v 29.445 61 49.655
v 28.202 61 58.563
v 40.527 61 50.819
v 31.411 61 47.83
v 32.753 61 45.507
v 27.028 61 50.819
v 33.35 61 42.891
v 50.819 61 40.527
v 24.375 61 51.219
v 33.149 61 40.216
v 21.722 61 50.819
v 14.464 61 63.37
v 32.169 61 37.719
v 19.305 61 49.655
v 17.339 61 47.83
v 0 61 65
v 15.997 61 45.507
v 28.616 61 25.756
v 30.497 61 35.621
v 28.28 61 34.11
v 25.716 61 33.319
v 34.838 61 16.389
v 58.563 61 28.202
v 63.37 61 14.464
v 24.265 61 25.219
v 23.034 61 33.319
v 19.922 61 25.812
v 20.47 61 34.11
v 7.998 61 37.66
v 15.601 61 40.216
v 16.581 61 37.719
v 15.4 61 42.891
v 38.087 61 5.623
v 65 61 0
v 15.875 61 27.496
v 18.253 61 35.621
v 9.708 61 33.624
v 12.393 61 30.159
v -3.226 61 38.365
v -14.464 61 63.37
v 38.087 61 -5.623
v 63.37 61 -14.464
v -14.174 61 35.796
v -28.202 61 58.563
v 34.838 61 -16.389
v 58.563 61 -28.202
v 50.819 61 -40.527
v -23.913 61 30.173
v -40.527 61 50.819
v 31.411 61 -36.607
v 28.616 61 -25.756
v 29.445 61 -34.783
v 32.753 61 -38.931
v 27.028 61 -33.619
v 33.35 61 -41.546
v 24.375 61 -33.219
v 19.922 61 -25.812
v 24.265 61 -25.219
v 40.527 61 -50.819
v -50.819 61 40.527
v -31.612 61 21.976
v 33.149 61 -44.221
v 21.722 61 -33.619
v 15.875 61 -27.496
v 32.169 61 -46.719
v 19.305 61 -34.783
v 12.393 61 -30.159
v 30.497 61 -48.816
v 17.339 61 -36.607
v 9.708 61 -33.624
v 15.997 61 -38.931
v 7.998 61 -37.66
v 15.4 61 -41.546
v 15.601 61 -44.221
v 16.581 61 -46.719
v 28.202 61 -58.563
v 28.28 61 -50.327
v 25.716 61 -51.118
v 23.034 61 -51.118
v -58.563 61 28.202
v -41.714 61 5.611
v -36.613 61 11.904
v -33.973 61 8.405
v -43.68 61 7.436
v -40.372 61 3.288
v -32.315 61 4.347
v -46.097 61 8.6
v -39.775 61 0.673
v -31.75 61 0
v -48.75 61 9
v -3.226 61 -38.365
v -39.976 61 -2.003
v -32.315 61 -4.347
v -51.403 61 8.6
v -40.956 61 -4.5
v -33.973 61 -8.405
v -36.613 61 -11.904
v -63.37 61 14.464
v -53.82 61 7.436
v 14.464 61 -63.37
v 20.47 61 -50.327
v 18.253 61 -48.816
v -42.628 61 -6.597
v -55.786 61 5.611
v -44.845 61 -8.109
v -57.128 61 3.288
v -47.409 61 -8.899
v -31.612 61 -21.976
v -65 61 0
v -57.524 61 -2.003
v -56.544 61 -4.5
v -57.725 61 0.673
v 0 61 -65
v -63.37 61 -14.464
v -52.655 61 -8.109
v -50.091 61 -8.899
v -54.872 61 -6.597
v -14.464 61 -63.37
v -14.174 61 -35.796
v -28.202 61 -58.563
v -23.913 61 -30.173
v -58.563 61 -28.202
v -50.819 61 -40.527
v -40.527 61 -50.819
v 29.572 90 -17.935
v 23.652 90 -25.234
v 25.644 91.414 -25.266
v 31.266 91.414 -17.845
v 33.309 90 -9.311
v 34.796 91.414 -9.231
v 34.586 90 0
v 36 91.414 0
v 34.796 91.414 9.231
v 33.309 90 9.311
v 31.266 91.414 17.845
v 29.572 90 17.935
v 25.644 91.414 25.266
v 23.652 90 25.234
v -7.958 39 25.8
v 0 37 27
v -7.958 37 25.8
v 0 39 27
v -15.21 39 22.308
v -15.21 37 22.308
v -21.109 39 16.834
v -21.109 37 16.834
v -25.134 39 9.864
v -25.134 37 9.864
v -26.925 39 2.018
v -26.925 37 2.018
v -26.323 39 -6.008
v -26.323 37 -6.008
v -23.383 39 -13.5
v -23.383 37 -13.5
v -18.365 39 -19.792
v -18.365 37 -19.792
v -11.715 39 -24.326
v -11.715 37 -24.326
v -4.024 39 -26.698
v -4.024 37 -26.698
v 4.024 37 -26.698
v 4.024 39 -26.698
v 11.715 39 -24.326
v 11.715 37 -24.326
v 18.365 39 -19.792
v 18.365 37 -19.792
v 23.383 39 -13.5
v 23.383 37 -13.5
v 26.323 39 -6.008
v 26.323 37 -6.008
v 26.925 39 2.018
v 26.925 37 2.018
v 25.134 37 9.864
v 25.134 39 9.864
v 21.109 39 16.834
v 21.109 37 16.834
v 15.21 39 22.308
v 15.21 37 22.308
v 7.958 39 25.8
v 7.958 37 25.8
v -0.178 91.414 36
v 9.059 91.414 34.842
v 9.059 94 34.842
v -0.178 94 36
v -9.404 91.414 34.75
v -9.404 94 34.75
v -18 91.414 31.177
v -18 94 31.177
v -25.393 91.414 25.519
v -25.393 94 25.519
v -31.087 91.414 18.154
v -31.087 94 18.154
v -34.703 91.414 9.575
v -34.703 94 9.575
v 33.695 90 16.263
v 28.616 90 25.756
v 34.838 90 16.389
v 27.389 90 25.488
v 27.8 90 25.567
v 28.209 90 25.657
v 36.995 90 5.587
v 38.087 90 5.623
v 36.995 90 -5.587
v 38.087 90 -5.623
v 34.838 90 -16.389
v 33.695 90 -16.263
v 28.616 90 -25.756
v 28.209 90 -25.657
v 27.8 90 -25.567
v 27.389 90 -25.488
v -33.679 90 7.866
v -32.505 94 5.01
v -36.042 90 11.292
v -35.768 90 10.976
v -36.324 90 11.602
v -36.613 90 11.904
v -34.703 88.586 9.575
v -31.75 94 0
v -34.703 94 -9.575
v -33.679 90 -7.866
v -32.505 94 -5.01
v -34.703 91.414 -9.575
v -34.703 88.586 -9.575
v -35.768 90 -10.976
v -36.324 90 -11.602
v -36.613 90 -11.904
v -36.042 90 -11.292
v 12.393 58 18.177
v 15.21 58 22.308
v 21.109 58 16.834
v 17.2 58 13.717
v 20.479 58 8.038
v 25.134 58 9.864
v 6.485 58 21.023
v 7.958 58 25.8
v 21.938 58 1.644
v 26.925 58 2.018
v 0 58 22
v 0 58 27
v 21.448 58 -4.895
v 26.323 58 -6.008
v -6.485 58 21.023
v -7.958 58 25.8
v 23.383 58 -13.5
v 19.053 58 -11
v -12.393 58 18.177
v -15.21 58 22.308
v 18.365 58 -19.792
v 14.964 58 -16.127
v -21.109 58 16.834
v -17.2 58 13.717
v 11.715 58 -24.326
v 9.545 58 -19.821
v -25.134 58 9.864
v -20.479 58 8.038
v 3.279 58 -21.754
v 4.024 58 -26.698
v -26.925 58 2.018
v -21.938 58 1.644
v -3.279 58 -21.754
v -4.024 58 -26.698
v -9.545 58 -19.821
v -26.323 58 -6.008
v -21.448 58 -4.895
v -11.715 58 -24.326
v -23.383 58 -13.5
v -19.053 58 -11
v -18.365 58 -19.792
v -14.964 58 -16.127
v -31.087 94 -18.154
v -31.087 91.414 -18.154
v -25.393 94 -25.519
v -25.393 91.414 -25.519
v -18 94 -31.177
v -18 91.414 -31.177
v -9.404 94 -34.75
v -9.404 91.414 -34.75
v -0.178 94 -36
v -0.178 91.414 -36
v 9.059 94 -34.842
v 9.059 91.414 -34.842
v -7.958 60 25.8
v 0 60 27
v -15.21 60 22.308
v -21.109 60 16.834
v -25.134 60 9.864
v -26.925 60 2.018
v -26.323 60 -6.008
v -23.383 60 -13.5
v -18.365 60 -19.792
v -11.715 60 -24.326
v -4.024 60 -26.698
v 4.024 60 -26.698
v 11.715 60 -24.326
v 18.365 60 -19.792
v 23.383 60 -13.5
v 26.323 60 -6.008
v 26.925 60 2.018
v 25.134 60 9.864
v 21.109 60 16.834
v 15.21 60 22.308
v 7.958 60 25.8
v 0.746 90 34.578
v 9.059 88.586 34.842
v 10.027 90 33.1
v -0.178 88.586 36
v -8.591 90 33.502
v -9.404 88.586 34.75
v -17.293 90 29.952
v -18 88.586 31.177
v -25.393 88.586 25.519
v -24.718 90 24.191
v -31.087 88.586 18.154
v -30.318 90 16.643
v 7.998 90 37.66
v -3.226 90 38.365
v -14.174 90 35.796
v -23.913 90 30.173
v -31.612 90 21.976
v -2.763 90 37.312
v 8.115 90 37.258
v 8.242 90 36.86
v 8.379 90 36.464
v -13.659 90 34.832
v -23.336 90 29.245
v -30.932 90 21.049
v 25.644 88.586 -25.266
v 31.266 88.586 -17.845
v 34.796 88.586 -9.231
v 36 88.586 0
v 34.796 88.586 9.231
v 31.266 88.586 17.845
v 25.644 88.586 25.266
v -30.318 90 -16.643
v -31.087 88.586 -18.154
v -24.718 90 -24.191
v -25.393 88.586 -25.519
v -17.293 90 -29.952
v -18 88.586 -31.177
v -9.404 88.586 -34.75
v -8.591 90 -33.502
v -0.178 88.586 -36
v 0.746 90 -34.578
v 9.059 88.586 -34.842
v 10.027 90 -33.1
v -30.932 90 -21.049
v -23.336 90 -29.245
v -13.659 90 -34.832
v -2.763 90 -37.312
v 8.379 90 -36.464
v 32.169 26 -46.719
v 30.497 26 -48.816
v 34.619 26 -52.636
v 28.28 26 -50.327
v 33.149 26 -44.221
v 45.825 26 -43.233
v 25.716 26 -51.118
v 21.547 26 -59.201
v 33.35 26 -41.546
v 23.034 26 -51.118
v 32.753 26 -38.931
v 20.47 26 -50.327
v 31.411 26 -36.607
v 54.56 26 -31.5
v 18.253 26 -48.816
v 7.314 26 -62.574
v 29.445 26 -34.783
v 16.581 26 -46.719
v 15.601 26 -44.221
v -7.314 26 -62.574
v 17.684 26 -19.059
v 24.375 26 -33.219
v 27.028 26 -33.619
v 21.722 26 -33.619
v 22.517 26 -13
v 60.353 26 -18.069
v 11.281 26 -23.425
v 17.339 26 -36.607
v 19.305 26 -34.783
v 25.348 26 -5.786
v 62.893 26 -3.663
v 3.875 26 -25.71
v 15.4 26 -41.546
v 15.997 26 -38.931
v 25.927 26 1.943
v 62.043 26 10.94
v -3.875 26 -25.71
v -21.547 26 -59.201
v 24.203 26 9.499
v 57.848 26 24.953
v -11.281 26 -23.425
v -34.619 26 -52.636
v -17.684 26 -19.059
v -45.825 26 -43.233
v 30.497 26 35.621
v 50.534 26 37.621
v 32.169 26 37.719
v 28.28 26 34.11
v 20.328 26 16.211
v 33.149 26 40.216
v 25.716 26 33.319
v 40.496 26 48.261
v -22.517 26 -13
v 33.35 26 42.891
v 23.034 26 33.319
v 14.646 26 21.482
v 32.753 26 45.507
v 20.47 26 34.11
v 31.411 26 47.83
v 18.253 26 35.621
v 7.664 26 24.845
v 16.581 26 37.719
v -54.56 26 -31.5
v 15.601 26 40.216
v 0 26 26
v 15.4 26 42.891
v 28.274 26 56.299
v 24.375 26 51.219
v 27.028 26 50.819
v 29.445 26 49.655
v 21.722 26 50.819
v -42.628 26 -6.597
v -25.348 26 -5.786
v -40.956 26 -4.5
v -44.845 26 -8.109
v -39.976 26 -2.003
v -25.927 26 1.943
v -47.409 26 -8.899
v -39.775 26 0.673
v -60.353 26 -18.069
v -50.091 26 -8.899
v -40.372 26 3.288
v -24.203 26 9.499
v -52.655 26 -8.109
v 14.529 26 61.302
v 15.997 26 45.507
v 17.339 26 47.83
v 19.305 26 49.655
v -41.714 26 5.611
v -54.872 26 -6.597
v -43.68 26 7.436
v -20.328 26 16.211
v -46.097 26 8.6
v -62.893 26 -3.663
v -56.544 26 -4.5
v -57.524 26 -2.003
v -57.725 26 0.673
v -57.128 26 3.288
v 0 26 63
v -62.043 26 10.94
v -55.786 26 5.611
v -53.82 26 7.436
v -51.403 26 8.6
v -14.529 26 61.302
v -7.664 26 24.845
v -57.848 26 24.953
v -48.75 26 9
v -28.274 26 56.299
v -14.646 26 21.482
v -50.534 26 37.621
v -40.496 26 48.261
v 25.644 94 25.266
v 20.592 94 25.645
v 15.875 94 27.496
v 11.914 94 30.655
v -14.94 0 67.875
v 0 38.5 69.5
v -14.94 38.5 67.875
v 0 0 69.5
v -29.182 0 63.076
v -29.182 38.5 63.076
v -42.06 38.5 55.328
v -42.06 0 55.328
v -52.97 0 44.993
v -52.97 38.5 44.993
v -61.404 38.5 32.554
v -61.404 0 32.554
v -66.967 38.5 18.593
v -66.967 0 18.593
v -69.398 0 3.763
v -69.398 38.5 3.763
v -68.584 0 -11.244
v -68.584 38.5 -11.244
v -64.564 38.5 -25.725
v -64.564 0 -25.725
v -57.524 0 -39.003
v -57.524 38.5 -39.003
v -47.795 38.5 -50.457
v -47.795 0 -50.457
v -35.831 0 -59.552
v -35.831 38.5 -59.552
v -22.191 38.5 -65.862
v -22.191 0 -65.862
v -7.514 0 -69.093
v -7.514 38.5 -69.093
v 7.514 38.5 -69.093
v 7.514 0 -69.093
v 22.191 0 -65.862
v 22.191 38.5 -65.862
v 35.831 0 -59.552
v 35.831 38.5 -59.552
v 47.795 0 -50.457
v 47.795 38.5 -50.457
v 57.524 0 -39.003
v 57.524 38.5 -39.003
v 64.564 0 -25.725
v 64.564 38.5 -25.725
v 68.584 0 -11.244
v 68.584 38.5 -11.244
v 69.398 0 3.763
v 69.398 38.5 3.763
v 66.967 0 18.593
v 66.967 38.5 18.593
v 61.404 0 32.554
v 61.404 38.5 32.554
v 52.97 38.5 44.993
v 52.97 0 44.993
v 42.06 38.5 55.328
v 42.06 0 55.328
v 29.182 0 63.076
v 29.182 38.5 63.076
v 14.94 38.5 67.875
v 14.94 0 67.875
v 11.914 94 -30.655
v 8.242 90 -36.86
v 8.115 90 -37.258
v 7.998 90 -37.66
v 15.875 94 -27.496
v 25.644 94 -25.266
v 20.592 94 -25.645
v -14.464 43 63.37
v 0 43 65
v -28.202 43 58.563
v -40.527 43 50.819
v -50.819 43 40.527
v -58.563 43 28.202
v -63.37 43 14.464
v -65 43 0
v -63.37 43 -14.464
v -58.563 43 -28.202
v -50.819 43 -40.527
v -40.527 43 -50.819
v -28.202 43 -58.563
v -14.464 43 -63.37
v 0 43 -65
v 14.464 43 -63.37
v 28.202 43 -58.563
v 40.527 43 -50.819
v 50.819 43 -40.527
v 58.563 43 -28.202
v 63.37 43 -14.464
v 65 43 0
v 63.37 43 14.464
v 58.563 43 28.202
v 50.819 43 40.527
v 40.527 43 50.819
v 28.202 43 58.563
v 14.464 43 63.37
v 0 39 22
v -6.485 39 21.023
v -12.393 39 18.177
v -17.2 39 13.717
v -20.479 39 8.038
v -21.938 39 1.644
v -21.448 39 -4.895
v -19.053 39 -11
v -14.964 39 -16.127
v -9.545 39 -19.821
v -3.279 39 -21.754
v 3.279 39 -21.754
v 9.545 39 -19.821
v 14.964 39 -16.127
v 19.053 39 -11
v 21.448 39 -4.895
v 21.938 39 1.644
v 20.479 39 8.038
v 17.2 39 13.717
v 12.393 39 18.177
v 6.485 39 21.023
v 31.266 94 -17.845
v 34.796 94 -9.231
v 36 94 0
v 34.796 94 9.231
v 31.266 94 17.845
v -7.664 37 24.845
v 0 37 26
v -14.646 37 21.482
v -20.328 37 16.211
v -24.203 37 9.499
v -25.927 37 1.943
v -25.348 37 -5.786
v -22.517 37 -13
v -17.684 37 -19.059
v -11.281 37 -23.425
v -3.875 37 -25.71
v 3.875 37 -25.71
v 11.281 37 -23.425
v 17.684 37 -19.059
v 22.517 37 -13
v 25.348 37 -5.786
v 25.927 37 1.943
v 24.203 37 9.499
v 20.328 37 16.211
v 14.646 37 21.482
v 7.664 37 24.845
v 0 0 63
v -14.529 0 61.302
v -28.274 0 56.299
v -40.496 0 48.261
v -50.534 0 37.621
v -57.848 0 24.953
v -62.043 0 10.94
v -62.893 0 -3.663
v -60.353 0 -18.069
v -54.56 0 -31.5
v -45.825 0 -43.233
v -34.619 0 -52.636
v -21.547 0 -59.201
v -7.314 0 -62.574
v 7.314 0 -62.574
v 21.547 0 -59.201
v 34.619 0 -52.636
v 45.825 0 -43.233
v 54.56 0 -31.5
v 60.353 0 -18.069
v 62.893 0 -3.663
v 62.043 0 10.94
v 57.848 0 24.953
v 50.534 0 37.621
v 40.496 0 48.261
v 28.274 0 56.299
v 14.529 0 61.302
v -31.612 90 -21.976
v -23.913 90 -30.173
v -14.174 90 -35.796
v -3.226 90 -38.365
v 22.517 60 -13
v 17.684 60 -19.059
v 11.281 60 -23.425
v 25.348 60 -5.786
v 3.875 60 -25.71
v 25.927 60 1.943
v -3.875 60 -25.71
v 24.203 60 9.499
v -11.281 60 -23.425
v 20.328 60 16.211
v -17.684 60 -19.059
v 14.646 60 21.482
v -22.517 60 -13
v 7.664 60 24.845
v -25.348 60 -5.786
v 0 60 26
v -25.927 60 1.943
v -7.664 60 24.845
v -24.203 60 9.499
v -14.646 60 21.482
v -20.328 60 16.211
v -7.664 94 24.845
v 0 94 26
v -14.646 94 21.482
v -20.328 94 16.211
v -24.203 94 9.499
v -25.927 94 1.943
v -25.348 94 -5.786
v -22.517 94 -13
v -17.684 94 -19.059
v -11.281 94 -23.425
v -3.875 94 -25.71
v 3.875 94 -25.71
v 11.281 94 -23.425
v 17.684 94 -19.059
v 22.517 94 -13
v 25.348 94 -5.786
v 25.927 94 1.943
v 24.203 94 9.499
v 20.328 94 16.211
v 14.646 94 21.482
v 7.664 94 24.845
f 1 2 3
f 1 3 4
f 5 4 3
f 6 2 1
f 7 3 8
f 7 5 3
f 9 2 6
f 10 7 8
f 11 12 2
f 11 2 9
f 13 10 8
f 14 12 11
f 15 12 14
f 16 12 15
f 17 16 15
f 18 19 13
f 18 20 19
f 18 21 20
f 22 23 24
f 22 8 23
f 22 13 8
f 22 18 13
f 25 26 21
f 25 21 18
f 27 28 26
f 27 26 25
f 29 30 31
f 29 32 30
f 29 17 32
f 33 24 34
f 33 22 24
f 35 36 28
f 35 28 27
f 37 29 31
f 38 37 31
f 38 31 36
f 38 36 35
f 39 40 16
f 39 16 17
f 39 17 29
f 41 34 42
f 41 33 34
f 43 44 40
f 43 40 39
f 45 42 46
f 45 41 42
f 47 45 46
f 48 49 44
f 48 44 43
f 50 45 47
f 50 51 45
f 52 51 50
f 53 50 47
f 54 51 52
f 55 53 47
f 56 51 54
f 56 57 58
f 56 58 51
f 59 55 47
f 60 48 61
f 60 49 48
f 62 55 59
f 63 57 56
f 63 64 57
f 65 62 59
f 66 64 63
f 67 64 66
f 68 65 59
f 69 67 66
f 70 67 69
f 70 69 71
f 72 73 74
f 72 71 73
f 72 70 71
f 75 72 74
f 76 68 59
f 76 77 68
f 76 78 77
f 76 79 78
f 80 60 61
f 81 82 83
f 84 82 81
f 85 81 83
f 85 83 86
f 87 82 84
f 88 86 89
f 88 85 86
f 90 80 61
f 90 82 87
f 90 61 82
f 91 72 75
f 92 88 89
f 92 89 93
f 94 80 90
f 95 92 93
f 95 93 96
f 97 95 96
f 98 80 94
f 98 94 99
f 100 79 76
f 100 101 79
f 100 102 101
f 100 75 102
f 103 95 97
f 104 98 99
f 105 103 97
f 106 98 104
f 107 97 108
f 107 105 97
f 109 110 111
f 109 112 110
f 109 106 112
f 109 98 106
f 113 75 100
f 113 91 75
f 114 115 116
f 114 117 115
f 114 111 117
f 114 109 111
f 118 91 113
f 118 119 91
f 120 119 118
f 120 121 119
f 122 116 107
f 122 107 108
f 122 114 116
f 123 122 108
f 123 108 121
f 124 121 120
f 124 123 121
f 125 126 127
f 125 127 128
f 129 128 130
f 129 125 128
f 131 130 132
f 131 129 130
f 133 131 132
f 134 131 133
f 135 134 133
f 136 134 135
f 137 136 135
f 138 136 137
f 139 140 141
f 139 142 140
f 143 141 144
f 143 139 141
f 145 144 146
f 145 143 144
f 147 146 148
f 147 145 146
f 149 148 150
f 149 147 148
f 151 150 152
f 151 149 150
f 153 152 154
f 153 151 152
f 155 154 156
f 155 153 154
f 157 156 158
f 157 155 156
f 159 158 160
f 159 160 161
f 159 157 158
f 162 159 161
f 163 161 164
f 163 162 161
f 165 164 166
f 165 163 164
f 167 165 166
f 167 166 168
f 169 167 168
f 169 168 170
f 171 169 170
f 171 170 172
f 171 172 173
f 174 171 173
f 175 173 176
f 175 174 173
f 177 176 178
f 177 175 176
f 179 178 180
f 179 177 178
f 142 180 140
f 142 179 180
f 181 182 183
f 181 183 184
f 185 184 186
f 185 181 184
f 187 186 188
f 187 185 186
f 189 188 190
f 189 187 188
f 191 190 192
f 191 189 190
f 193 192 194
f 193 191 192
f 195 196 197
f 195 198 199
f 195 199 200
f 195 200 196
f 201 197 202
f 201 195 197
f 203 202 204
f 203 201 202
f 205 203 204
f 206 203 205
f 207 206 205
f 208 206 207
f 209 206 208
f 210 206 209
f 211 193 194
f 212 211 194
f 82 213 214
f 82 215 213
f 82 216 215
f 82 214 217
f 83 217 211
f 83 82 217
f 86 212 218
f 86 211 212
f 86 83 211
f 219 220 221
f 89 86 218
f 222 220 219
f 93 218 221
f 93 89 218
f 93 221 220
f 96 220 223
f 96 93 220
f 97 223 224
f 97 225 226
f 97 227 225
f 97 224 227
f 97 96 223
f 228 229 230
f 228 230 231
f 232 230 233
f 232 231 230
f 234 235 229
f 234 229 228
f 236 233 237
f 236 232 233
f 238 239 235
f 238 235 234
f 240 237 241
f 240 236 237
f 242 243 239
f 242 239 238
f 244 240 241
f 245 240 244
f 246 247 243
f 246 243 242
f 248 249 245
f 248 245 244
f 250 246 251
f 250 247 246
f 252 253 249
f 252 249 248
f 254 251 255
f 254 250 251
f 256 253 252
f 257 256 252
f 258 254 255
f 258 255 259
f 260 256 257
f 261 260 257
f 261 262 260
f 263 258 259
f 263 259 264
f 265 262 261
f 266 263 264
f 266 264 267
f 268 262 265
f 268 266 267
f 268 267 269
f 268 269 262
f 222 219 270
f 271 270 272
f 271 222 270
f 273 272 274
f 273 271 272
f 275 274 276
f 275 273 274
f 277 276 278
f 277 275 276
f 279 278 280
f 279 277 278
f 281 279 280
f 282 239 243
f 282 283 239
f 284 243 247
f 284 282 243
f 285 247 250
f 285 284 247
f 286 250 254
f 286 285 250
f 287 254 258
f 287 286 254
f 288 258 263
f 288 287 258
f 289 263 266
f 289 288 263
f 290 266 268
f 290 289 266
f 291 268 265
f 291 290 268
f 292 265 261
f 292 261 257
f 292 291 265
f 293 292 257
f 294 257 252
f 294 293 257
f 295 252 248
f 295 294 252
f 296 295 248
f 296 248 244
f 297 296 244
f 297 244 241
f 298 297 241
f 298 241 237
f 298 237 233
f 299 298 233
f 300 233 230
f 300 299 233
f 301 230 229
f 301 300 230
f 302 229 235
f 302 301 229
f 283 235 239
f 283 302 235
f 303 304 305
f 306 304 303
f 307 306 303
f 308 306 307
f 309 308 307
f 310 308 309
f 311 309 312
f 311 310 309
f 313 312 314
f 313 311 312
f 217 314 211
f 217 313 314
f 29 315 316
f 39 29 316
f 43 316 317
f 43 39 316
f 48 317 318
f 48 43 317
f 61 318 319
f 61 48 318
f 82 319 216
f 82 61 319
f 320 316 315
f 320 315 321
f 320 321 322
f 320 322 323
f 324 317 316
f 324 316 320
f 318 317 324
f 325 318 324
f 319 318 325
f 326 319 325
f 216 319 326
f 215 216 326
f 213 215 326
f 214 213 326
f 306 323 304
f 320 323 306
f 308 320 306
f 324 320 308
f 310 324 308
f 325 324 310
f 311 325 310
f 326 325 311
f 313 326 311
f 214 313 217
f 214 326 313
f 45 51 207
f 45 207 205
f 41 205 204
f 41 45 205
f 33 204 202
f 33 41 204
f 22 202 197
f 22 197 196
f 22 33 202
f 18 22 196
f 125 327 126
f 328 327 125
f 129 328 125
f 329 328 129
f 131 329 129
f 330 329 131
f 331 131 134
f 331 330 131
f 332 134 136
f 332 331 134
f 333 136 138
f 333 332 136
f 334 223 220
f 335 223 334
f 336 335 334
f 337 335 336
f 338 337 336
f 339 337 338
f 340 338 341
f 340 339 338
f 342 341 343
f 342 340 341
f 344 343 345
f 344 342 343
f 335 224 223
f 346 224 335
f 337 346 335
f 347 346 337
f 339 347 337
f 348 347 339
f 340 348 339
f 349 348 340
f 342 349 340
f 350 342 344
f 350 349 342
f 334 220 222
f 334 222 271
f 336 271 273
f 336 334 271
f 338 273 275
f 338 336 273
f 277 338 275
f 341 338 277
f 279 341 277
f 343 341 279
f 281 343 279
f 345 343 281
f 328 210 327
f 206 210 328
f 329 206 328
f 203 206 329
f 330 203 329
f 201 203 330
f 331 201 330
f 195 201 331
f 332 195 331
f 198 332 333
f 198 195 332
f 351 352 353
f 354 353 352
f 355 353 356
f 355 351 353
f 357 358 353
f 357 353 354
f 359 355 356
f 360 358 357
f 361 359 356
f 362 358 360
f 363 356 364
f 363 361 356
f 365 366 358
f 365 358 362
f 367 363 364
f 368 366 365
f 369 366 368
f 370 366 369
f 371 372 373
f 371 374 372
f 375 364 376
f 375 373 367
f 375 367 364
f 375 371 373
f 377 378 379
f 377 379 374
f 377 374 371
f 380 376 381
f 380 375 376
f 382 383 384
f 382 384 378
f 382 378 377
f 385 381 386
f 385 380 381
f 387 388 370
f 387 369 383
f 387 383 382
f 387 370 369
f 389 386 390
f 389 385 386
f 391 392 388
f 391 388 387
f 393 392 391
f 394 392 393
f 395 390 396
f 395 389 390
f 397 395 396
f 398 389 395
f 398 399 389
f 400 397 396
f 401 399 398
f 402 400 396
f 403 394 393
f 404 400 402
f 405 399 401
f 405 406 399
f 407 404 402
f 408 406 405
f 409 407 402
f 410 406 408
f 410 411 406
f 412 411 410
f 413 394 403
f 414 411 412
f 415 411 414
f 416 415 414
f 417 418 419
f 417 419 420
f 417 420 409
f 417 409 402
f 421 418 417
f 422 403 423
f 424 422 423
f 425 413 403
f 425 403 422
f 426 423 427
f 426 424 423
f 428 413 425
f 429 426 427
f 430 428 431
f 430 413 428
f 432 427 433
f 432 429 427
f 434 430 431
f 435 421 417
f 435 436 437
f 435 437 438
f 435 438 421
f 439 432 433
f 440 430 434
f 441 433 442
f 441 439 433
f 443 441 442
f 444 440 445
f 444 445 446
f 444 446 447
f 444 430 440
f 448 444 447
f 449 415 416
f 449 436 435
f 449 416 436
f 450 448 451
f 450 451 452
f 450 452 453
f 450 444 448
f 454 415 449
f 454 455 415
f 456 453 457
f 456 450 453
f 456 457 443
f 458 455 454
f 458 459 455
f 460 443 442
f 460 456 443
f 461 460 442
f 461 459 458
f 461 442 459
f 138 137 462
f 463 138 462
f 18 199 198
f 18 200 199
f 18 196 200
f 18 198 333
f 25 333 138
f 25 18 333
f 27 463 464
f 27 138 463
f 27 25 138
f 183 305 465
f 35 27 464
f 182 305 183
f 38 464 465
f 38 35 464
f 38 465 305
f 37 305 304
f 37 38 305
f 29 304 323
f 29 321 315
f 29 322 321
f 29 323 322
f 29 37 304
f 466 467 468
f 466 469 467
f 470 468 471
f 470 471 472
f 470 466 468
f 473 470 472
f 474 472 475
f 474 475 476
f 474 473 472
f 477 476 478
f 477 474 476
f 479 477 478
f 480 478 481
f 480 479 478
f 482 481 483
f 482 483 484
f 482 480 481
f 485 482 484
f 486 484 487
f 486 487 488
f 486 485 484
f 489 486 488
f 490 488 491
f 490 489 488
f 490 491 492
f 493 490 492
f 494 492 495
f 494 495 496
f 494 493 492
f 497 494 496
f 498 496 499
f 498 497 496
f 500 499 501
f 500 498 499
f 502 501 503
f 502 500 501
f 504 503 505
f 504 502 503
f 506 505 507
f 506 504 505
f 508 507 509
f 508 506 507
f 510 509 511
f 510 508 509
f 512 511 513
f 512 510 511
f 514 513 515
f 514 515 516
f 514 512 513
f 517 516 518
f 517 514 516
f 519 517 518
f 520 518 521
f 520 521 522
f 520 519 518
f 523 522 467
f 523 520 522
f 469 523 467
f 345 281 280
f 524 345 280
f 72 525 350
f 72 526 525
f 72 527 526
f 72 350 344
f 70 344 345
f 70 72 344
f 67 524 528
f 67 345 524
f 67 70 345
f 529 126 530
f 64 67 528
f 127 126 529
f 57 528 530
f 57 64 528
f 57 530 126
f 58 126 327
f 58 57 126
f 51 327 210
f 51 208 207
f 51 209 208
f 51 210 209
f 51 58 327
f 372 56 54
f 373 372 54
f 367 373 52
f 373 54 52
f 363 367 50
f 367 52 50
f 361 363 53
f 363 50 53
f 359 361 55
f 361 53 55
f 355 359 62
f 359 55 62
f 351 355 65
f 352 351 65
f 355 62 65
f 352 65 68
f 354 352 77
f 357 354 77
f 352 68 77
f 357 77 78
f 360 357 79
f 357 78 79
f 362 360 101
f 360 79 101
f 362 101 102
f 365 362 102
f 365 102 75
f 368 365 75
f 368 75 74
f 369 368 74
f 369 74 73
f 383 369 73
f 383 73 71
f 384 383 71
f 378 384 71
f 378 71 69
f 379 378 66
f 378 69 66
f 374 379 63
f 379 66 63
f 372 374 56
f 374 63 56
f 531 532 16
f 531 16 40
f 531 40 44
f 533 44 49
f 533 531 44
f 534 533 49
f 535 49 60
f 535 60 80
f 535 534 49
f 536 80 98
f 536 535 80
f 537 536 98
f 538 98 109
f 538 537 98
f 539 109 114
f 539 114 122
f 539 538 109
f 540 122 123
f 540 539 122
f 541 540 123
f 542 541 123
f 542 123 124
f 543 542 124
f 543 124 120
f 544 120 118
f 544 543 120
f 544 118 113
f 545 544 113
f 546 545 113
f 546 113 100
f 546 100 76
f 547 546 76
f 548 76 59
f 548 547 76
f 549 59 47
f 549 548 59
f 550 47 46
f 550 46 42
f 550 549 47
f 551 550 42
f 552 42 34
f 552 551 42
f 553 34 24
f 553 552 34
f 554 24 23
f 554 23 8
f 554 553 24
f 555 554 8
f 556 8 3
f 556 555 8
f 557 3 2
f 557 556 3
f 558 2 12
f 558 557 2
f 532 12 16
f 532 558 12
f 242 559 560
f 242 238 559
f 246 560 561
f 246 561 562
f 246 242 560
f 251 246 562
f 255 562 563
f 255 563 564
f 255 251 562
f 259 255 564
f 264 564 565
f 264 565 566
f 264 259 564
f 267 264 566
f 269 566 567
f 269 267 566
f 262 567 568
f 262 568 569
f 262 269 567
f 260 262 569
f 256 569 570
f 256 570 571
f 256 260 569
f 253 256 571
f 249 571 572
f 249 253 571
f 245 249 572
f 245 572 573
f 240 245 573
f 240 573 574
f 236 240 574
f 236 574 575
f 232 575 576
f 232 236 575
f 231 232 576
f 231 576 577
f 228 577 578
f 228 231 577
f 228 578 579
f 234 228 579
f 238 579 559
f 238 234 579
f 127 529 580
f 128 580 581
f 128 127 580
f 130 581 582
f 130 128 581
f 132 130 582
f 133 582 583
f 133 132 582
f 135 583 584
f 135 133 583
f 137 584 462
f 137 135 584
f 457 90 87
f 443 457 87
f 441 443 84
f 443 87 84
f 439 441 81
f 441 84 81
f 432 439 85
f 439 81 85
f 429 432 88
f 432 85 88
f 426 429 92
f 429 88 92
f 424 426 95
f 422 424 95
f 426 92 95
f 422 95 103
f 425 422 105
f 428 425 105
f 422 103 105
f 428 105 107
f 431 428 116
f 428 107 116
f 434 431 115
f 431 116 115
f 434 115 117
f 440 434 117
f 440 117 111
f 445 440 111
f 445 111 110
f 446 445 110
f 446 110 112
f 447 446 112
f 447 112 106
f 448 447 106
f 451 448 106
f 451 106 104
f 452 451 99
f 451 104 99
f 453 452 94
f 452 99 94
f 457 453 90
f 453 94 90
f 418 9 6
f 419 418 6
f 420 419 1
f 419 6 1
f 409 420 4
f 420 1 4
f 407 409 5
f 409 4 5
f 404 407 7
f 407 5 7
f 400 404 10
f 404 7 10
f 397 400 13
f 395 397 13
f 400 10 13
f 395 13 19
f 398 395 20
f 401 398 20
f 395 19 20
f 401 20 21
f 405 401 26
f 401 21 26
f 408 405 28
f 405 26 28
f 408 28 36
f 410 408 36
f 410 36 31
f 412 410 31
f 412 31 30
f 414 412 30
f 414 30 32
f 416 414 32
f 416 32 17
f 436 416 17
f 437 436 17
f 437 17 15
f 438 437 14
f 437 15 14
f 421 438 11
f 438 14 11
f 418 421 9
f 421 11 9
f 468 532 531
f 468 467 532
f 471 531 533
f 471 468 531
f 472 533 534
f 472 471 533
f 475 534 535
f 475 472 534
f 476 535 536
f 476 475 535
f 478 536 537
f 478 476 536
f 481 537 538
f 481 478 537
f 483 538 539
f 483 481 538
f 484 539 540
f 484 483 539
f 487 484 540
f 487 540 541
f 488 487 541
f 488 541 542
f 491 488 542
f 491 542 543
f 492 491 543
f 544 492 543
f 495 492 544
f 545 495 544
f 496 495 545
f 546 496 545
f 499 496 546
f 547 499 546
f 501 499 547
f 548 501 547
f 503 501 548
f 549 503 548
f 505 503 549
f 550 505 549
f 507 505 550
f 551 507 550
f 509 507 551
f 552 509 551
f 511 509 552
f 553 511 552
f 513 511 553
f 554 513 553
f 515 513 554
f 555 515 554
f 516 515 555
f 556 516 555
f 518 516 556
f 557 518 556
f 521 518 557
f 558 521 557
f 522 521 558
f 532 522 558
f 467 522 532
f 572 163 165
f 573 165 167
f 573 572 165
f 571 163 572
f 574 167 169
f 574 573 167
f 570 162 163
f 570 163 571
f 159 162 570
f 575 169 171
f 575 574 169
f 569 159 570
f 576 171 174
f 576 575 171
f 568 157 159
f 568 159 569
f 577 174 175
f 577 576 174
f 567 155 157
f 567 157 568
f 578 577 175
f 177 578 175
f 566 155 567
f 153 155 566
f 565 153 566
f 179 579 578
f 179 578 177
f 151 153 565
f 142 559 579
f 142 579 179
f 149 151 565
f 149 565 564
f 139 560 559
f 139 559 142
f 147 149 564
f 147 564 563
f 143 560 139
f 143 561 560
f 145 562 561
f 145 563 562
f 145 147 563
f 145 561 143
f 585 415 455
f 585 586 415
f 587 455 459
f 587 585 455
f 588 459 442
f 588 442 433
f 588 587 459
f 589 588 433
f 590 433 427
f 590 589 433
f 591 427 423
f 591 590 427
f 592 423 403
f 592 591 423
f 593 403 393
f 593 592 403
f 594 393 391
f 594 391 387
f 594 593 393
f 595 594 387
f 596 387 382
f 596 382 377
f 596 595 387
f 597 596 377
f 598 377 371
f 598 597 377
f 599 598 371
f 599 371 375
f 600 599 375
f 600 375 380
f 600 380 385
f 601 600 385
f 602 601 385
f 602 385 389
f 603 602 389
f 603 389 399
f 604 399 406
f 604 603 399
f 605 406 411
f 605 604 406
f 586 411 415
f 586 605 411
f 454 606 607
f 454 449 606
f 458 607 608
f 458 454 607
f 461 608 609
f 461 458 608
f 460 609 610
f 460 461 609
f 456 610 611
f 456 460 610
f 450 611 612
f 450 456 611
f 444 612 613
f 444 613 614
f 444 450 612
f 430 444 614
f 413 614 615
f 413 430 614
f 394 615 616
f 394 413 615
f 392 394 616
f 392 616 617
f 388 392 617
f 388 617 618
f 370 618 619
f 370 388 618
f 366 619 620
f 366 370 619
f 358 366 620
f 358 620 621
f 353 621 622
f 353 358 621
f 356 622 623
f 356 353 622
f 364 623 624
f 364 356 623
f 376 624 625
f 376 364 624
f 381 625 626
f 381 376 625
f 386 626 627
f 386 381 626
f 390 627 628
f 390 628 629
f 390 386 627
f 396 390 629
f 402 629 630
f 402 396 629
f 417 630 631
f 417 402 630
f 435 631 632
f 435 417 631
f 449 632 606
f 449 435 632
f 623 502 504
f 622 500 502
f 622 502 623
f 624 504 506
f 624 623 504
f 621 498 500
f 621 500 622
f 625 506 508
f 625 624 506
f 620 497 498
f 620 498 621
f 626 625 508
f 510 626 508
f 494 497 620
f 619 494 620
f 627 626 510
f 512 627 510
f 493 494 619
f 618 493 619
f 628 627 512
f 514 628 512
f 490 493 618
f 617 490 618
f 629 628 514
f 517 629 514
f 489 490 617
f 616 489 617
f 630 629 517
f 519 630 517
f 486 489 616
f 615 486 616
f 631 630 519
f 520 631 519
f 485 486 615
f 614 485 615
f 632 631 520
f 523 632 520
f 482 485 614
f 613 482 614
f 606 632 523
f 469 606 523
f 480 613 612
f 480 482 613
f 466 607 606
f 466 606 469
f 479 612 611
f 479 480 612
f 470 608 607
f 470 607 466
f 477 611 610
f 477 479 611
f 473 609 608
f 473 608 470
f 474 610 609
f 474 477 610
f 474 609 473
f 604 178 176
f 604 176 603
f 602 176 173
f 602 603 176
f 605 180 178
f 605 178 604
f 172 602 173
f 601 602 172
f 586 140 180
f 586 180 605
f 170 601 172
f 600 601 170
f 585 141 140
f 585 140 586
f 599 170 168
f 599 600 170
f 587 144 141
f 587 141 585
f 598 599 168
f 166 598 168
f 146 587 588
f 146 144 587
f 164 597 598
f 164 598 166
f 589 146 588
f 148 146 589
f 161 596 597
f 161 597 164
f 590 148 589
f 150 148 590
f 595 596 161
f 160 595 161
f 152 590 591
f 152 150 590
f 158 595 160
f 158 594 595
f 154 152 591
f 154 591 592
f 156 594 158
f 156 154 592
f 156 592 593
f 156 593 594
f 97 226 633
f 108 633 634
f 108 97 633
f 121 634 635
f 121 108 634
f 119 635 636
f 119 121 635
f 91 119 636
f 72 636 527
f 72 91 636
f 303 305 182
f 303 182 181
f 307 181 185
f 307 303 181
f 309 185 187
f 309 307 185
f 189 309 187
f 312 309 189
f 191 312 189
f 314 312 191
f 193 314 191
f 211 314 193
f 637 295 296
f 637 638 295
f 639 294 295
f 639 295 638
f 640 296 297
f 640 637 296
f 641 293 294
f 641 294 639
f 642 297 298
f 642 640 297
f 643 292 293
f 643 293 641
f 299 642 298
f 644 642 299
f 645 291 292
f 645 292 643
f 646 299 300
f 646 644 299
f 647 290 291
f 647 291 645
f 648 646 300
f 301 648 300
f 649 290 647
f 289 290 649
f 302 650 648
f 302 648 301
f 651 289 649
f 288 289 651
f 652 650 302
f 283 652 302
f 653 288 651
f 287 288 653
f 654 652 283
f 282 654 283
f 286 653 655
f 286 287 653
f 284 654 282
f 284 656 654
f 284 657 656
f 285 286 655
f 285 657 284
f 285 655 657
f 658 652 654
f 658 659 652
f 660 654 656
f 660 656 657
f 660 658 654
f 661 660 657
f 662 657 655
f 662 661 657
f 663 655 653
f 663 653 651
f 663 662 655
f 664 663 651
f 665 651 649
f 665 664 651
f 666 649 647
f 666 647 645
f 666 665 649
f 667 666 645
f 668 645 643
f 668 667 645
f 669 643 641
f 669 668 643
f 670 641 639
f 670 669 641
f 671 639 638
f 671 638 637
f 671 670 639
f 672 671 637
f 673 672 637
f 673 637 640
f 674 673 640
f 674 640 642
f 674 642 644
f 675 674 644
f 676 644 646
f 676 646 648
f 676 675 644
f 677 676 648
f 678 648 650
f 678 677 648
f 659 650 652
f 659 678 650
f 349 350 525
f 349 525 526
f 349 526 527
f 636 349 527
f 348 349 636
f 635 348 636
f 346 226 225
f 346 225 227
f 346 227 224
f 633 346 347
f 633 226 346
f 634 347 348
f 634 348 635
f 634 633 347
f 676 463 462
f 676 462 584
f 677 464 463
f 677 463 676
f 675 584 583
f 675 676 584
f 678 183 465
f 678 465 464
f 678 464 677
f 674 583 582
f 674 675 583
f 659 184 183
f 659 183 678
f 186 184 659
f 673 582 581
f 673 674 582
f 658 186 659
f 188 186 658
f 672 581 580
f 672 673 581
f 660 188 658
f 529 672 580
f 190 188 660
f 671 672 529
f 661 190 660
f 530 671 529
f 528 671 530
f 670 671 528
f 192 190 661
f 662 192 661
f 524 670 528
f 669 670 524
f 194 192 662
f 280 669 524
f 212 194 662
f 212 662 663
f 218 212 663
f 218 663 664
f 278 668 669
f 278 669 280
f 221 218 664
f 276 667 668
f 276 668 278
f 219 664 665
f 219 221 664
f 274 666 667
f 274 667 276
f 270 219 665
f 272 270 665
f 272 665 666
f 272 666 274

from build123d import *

# Parameters (mm, degrees)
CUT_EXTRUDE_1_REACH = 117.678
SKETCH_2_R          = 17
SKETCH_3_R          = 9
CUT_EXTRUDE_2_DEPTH = 35


with BuildPart() as part:
    # 草图1 → 旋转1 (revolve)
    with BuildSketch(Plane.XY, mode=Mode.PRIVATE) as revolve_1_sk:
        Polygon((63, 0), (63, 26), (26, 26), (26, 37), (27, 37), (27, 39), (22, 39), (22, 58), (27, 58), (27, 60), (26, 60), (26, 94), (36, 94), (36, 91.414213562), (34.585786438, 90), (36, 88.585786438), (37.414213562, 90), (38.5, 90), (38.5, 61), (65, 61), (65, 43), (69.5, 38.5), (69.5, 0), align=None)
    revolve(revolve_1_sk.sketch.rotate(Axis((0, 19.246271831, 0), (0, -1, 0)), 90), axis=Axis((0, 19.246271831, 0), (0, -1, 0)))

    # 切除-拉伸1: up to this face of the body (flat: up to its plane)
    cut_extrude_1_end = Plane(part.part.faces().sort_by_distance((0, 94, -27.018233765))[0])
    # 草图2 → 切除-拉伸1 (cut, up to the picked face)
    with BuildSketch(Plane(origin=(0, 61, 0), x_dir=(1, 0, 0), z_dir=(0, 1, 0)), mode=Mode.PRIVATE) as cut_extrude_1_sk1:
        with Locations((-48.75, 0)):
            Circle(SKETCH_2_R)
    cut_extrude_1_tool1 = split(extrude(cut_extrude_1_sk1.sketch, amount=CUT_EXTRUDE_1_REACH, mode=Mode.PRIVATE), bisect_by=cut_extrude_1_end, keep=Keep.BOTH, mode=Mode.PRIVATE)
    # 草图2 → 切除-拉伸1 (cut, up to the picked face)
    with BuildSketch(Plane(origin=(0, 61, 0), x_dir=(1, 0, 0), z_dir=(0, 1, 0)), mode=Mode.PRIVATE) as cut_extrude_1_sk2:
        with Locations((24.375, 42.218738434)):
            Circle(SKETCH_2_R)
    cut_extrude_1_tool2 = split(extrude(cut_extrude_1_sk2.sketch, amount=CUT_EXTRUDE_1_REACH, mode=Mode.PRIVATE), bisect_by=cut_extrude_1_end, keep=Keep.BOTH, mode=Mode.PRIVATE)
    # 草图2 → 切除-拉伸1 (cut, up to the picked face)
    with BuildSketch(Plane(origin=(0, 61, 0), x_dir=(1, 0, 0), z_dir=(0, 1, 0)), mode=Mode.PRIVATE) as cut_extrude_1_sk3:
        with Locations((24.375, -42.218738434)):
            Circle(SKETCH_2_R)
    cut_extrude_1_tool3 = split(extrude(cut_extrude_1_sk3.sketch, amount=CUT_EXTRUDE_1_REACH, mode=Mode.PRIVATE), bisect_by=cut_extrude_1_end, keep=Keep.BOTH, mode=Mode.PRIVATE)
    add(cut_extrude_1_tool1.solids().sort_by(Axis((-48.75, 61, 0), (0, 1, 0)))[0], mode=Mode.SUBTRACT)
    add(cut_extrude_1_tool2.solids().sort_by(Axis((24.375, 61, -42.218738), (0, 1, 0)))[0], mode=Mode.SUBTRACT)
    add(cut_extrude_1_tool3.solids().sort_by(Axis((24.375, 61, 42.218738), (0, 1, 0)))[0], mode=Mode.SUBTRACT)

    # 草图3 → 切除-拉伸2 (cut)
    with BuildSketch(Plane(origin=(0, 61, 0), x_dir=(1, 0, 0), z_dir=(0, 1, 0))):
        with Locations(Location((24.375, 42.218738434, 0), (0, 0, 270))):
            Circle(SKETCH_3_R)
        with Locations(Location((24.375, -42.218738434, 0), (0, 0, 270))):
            Circle(SKETCH_3_R)
        with Locations(Location((-48.75, 0, 0), (0, 0, 270))):
            Circle(SKETCH_3_R)
    extrude(amount=-CUT_EXTRUDE_2_DEPTH, mode=Mode.SUBTRACT)


solid = part.part
